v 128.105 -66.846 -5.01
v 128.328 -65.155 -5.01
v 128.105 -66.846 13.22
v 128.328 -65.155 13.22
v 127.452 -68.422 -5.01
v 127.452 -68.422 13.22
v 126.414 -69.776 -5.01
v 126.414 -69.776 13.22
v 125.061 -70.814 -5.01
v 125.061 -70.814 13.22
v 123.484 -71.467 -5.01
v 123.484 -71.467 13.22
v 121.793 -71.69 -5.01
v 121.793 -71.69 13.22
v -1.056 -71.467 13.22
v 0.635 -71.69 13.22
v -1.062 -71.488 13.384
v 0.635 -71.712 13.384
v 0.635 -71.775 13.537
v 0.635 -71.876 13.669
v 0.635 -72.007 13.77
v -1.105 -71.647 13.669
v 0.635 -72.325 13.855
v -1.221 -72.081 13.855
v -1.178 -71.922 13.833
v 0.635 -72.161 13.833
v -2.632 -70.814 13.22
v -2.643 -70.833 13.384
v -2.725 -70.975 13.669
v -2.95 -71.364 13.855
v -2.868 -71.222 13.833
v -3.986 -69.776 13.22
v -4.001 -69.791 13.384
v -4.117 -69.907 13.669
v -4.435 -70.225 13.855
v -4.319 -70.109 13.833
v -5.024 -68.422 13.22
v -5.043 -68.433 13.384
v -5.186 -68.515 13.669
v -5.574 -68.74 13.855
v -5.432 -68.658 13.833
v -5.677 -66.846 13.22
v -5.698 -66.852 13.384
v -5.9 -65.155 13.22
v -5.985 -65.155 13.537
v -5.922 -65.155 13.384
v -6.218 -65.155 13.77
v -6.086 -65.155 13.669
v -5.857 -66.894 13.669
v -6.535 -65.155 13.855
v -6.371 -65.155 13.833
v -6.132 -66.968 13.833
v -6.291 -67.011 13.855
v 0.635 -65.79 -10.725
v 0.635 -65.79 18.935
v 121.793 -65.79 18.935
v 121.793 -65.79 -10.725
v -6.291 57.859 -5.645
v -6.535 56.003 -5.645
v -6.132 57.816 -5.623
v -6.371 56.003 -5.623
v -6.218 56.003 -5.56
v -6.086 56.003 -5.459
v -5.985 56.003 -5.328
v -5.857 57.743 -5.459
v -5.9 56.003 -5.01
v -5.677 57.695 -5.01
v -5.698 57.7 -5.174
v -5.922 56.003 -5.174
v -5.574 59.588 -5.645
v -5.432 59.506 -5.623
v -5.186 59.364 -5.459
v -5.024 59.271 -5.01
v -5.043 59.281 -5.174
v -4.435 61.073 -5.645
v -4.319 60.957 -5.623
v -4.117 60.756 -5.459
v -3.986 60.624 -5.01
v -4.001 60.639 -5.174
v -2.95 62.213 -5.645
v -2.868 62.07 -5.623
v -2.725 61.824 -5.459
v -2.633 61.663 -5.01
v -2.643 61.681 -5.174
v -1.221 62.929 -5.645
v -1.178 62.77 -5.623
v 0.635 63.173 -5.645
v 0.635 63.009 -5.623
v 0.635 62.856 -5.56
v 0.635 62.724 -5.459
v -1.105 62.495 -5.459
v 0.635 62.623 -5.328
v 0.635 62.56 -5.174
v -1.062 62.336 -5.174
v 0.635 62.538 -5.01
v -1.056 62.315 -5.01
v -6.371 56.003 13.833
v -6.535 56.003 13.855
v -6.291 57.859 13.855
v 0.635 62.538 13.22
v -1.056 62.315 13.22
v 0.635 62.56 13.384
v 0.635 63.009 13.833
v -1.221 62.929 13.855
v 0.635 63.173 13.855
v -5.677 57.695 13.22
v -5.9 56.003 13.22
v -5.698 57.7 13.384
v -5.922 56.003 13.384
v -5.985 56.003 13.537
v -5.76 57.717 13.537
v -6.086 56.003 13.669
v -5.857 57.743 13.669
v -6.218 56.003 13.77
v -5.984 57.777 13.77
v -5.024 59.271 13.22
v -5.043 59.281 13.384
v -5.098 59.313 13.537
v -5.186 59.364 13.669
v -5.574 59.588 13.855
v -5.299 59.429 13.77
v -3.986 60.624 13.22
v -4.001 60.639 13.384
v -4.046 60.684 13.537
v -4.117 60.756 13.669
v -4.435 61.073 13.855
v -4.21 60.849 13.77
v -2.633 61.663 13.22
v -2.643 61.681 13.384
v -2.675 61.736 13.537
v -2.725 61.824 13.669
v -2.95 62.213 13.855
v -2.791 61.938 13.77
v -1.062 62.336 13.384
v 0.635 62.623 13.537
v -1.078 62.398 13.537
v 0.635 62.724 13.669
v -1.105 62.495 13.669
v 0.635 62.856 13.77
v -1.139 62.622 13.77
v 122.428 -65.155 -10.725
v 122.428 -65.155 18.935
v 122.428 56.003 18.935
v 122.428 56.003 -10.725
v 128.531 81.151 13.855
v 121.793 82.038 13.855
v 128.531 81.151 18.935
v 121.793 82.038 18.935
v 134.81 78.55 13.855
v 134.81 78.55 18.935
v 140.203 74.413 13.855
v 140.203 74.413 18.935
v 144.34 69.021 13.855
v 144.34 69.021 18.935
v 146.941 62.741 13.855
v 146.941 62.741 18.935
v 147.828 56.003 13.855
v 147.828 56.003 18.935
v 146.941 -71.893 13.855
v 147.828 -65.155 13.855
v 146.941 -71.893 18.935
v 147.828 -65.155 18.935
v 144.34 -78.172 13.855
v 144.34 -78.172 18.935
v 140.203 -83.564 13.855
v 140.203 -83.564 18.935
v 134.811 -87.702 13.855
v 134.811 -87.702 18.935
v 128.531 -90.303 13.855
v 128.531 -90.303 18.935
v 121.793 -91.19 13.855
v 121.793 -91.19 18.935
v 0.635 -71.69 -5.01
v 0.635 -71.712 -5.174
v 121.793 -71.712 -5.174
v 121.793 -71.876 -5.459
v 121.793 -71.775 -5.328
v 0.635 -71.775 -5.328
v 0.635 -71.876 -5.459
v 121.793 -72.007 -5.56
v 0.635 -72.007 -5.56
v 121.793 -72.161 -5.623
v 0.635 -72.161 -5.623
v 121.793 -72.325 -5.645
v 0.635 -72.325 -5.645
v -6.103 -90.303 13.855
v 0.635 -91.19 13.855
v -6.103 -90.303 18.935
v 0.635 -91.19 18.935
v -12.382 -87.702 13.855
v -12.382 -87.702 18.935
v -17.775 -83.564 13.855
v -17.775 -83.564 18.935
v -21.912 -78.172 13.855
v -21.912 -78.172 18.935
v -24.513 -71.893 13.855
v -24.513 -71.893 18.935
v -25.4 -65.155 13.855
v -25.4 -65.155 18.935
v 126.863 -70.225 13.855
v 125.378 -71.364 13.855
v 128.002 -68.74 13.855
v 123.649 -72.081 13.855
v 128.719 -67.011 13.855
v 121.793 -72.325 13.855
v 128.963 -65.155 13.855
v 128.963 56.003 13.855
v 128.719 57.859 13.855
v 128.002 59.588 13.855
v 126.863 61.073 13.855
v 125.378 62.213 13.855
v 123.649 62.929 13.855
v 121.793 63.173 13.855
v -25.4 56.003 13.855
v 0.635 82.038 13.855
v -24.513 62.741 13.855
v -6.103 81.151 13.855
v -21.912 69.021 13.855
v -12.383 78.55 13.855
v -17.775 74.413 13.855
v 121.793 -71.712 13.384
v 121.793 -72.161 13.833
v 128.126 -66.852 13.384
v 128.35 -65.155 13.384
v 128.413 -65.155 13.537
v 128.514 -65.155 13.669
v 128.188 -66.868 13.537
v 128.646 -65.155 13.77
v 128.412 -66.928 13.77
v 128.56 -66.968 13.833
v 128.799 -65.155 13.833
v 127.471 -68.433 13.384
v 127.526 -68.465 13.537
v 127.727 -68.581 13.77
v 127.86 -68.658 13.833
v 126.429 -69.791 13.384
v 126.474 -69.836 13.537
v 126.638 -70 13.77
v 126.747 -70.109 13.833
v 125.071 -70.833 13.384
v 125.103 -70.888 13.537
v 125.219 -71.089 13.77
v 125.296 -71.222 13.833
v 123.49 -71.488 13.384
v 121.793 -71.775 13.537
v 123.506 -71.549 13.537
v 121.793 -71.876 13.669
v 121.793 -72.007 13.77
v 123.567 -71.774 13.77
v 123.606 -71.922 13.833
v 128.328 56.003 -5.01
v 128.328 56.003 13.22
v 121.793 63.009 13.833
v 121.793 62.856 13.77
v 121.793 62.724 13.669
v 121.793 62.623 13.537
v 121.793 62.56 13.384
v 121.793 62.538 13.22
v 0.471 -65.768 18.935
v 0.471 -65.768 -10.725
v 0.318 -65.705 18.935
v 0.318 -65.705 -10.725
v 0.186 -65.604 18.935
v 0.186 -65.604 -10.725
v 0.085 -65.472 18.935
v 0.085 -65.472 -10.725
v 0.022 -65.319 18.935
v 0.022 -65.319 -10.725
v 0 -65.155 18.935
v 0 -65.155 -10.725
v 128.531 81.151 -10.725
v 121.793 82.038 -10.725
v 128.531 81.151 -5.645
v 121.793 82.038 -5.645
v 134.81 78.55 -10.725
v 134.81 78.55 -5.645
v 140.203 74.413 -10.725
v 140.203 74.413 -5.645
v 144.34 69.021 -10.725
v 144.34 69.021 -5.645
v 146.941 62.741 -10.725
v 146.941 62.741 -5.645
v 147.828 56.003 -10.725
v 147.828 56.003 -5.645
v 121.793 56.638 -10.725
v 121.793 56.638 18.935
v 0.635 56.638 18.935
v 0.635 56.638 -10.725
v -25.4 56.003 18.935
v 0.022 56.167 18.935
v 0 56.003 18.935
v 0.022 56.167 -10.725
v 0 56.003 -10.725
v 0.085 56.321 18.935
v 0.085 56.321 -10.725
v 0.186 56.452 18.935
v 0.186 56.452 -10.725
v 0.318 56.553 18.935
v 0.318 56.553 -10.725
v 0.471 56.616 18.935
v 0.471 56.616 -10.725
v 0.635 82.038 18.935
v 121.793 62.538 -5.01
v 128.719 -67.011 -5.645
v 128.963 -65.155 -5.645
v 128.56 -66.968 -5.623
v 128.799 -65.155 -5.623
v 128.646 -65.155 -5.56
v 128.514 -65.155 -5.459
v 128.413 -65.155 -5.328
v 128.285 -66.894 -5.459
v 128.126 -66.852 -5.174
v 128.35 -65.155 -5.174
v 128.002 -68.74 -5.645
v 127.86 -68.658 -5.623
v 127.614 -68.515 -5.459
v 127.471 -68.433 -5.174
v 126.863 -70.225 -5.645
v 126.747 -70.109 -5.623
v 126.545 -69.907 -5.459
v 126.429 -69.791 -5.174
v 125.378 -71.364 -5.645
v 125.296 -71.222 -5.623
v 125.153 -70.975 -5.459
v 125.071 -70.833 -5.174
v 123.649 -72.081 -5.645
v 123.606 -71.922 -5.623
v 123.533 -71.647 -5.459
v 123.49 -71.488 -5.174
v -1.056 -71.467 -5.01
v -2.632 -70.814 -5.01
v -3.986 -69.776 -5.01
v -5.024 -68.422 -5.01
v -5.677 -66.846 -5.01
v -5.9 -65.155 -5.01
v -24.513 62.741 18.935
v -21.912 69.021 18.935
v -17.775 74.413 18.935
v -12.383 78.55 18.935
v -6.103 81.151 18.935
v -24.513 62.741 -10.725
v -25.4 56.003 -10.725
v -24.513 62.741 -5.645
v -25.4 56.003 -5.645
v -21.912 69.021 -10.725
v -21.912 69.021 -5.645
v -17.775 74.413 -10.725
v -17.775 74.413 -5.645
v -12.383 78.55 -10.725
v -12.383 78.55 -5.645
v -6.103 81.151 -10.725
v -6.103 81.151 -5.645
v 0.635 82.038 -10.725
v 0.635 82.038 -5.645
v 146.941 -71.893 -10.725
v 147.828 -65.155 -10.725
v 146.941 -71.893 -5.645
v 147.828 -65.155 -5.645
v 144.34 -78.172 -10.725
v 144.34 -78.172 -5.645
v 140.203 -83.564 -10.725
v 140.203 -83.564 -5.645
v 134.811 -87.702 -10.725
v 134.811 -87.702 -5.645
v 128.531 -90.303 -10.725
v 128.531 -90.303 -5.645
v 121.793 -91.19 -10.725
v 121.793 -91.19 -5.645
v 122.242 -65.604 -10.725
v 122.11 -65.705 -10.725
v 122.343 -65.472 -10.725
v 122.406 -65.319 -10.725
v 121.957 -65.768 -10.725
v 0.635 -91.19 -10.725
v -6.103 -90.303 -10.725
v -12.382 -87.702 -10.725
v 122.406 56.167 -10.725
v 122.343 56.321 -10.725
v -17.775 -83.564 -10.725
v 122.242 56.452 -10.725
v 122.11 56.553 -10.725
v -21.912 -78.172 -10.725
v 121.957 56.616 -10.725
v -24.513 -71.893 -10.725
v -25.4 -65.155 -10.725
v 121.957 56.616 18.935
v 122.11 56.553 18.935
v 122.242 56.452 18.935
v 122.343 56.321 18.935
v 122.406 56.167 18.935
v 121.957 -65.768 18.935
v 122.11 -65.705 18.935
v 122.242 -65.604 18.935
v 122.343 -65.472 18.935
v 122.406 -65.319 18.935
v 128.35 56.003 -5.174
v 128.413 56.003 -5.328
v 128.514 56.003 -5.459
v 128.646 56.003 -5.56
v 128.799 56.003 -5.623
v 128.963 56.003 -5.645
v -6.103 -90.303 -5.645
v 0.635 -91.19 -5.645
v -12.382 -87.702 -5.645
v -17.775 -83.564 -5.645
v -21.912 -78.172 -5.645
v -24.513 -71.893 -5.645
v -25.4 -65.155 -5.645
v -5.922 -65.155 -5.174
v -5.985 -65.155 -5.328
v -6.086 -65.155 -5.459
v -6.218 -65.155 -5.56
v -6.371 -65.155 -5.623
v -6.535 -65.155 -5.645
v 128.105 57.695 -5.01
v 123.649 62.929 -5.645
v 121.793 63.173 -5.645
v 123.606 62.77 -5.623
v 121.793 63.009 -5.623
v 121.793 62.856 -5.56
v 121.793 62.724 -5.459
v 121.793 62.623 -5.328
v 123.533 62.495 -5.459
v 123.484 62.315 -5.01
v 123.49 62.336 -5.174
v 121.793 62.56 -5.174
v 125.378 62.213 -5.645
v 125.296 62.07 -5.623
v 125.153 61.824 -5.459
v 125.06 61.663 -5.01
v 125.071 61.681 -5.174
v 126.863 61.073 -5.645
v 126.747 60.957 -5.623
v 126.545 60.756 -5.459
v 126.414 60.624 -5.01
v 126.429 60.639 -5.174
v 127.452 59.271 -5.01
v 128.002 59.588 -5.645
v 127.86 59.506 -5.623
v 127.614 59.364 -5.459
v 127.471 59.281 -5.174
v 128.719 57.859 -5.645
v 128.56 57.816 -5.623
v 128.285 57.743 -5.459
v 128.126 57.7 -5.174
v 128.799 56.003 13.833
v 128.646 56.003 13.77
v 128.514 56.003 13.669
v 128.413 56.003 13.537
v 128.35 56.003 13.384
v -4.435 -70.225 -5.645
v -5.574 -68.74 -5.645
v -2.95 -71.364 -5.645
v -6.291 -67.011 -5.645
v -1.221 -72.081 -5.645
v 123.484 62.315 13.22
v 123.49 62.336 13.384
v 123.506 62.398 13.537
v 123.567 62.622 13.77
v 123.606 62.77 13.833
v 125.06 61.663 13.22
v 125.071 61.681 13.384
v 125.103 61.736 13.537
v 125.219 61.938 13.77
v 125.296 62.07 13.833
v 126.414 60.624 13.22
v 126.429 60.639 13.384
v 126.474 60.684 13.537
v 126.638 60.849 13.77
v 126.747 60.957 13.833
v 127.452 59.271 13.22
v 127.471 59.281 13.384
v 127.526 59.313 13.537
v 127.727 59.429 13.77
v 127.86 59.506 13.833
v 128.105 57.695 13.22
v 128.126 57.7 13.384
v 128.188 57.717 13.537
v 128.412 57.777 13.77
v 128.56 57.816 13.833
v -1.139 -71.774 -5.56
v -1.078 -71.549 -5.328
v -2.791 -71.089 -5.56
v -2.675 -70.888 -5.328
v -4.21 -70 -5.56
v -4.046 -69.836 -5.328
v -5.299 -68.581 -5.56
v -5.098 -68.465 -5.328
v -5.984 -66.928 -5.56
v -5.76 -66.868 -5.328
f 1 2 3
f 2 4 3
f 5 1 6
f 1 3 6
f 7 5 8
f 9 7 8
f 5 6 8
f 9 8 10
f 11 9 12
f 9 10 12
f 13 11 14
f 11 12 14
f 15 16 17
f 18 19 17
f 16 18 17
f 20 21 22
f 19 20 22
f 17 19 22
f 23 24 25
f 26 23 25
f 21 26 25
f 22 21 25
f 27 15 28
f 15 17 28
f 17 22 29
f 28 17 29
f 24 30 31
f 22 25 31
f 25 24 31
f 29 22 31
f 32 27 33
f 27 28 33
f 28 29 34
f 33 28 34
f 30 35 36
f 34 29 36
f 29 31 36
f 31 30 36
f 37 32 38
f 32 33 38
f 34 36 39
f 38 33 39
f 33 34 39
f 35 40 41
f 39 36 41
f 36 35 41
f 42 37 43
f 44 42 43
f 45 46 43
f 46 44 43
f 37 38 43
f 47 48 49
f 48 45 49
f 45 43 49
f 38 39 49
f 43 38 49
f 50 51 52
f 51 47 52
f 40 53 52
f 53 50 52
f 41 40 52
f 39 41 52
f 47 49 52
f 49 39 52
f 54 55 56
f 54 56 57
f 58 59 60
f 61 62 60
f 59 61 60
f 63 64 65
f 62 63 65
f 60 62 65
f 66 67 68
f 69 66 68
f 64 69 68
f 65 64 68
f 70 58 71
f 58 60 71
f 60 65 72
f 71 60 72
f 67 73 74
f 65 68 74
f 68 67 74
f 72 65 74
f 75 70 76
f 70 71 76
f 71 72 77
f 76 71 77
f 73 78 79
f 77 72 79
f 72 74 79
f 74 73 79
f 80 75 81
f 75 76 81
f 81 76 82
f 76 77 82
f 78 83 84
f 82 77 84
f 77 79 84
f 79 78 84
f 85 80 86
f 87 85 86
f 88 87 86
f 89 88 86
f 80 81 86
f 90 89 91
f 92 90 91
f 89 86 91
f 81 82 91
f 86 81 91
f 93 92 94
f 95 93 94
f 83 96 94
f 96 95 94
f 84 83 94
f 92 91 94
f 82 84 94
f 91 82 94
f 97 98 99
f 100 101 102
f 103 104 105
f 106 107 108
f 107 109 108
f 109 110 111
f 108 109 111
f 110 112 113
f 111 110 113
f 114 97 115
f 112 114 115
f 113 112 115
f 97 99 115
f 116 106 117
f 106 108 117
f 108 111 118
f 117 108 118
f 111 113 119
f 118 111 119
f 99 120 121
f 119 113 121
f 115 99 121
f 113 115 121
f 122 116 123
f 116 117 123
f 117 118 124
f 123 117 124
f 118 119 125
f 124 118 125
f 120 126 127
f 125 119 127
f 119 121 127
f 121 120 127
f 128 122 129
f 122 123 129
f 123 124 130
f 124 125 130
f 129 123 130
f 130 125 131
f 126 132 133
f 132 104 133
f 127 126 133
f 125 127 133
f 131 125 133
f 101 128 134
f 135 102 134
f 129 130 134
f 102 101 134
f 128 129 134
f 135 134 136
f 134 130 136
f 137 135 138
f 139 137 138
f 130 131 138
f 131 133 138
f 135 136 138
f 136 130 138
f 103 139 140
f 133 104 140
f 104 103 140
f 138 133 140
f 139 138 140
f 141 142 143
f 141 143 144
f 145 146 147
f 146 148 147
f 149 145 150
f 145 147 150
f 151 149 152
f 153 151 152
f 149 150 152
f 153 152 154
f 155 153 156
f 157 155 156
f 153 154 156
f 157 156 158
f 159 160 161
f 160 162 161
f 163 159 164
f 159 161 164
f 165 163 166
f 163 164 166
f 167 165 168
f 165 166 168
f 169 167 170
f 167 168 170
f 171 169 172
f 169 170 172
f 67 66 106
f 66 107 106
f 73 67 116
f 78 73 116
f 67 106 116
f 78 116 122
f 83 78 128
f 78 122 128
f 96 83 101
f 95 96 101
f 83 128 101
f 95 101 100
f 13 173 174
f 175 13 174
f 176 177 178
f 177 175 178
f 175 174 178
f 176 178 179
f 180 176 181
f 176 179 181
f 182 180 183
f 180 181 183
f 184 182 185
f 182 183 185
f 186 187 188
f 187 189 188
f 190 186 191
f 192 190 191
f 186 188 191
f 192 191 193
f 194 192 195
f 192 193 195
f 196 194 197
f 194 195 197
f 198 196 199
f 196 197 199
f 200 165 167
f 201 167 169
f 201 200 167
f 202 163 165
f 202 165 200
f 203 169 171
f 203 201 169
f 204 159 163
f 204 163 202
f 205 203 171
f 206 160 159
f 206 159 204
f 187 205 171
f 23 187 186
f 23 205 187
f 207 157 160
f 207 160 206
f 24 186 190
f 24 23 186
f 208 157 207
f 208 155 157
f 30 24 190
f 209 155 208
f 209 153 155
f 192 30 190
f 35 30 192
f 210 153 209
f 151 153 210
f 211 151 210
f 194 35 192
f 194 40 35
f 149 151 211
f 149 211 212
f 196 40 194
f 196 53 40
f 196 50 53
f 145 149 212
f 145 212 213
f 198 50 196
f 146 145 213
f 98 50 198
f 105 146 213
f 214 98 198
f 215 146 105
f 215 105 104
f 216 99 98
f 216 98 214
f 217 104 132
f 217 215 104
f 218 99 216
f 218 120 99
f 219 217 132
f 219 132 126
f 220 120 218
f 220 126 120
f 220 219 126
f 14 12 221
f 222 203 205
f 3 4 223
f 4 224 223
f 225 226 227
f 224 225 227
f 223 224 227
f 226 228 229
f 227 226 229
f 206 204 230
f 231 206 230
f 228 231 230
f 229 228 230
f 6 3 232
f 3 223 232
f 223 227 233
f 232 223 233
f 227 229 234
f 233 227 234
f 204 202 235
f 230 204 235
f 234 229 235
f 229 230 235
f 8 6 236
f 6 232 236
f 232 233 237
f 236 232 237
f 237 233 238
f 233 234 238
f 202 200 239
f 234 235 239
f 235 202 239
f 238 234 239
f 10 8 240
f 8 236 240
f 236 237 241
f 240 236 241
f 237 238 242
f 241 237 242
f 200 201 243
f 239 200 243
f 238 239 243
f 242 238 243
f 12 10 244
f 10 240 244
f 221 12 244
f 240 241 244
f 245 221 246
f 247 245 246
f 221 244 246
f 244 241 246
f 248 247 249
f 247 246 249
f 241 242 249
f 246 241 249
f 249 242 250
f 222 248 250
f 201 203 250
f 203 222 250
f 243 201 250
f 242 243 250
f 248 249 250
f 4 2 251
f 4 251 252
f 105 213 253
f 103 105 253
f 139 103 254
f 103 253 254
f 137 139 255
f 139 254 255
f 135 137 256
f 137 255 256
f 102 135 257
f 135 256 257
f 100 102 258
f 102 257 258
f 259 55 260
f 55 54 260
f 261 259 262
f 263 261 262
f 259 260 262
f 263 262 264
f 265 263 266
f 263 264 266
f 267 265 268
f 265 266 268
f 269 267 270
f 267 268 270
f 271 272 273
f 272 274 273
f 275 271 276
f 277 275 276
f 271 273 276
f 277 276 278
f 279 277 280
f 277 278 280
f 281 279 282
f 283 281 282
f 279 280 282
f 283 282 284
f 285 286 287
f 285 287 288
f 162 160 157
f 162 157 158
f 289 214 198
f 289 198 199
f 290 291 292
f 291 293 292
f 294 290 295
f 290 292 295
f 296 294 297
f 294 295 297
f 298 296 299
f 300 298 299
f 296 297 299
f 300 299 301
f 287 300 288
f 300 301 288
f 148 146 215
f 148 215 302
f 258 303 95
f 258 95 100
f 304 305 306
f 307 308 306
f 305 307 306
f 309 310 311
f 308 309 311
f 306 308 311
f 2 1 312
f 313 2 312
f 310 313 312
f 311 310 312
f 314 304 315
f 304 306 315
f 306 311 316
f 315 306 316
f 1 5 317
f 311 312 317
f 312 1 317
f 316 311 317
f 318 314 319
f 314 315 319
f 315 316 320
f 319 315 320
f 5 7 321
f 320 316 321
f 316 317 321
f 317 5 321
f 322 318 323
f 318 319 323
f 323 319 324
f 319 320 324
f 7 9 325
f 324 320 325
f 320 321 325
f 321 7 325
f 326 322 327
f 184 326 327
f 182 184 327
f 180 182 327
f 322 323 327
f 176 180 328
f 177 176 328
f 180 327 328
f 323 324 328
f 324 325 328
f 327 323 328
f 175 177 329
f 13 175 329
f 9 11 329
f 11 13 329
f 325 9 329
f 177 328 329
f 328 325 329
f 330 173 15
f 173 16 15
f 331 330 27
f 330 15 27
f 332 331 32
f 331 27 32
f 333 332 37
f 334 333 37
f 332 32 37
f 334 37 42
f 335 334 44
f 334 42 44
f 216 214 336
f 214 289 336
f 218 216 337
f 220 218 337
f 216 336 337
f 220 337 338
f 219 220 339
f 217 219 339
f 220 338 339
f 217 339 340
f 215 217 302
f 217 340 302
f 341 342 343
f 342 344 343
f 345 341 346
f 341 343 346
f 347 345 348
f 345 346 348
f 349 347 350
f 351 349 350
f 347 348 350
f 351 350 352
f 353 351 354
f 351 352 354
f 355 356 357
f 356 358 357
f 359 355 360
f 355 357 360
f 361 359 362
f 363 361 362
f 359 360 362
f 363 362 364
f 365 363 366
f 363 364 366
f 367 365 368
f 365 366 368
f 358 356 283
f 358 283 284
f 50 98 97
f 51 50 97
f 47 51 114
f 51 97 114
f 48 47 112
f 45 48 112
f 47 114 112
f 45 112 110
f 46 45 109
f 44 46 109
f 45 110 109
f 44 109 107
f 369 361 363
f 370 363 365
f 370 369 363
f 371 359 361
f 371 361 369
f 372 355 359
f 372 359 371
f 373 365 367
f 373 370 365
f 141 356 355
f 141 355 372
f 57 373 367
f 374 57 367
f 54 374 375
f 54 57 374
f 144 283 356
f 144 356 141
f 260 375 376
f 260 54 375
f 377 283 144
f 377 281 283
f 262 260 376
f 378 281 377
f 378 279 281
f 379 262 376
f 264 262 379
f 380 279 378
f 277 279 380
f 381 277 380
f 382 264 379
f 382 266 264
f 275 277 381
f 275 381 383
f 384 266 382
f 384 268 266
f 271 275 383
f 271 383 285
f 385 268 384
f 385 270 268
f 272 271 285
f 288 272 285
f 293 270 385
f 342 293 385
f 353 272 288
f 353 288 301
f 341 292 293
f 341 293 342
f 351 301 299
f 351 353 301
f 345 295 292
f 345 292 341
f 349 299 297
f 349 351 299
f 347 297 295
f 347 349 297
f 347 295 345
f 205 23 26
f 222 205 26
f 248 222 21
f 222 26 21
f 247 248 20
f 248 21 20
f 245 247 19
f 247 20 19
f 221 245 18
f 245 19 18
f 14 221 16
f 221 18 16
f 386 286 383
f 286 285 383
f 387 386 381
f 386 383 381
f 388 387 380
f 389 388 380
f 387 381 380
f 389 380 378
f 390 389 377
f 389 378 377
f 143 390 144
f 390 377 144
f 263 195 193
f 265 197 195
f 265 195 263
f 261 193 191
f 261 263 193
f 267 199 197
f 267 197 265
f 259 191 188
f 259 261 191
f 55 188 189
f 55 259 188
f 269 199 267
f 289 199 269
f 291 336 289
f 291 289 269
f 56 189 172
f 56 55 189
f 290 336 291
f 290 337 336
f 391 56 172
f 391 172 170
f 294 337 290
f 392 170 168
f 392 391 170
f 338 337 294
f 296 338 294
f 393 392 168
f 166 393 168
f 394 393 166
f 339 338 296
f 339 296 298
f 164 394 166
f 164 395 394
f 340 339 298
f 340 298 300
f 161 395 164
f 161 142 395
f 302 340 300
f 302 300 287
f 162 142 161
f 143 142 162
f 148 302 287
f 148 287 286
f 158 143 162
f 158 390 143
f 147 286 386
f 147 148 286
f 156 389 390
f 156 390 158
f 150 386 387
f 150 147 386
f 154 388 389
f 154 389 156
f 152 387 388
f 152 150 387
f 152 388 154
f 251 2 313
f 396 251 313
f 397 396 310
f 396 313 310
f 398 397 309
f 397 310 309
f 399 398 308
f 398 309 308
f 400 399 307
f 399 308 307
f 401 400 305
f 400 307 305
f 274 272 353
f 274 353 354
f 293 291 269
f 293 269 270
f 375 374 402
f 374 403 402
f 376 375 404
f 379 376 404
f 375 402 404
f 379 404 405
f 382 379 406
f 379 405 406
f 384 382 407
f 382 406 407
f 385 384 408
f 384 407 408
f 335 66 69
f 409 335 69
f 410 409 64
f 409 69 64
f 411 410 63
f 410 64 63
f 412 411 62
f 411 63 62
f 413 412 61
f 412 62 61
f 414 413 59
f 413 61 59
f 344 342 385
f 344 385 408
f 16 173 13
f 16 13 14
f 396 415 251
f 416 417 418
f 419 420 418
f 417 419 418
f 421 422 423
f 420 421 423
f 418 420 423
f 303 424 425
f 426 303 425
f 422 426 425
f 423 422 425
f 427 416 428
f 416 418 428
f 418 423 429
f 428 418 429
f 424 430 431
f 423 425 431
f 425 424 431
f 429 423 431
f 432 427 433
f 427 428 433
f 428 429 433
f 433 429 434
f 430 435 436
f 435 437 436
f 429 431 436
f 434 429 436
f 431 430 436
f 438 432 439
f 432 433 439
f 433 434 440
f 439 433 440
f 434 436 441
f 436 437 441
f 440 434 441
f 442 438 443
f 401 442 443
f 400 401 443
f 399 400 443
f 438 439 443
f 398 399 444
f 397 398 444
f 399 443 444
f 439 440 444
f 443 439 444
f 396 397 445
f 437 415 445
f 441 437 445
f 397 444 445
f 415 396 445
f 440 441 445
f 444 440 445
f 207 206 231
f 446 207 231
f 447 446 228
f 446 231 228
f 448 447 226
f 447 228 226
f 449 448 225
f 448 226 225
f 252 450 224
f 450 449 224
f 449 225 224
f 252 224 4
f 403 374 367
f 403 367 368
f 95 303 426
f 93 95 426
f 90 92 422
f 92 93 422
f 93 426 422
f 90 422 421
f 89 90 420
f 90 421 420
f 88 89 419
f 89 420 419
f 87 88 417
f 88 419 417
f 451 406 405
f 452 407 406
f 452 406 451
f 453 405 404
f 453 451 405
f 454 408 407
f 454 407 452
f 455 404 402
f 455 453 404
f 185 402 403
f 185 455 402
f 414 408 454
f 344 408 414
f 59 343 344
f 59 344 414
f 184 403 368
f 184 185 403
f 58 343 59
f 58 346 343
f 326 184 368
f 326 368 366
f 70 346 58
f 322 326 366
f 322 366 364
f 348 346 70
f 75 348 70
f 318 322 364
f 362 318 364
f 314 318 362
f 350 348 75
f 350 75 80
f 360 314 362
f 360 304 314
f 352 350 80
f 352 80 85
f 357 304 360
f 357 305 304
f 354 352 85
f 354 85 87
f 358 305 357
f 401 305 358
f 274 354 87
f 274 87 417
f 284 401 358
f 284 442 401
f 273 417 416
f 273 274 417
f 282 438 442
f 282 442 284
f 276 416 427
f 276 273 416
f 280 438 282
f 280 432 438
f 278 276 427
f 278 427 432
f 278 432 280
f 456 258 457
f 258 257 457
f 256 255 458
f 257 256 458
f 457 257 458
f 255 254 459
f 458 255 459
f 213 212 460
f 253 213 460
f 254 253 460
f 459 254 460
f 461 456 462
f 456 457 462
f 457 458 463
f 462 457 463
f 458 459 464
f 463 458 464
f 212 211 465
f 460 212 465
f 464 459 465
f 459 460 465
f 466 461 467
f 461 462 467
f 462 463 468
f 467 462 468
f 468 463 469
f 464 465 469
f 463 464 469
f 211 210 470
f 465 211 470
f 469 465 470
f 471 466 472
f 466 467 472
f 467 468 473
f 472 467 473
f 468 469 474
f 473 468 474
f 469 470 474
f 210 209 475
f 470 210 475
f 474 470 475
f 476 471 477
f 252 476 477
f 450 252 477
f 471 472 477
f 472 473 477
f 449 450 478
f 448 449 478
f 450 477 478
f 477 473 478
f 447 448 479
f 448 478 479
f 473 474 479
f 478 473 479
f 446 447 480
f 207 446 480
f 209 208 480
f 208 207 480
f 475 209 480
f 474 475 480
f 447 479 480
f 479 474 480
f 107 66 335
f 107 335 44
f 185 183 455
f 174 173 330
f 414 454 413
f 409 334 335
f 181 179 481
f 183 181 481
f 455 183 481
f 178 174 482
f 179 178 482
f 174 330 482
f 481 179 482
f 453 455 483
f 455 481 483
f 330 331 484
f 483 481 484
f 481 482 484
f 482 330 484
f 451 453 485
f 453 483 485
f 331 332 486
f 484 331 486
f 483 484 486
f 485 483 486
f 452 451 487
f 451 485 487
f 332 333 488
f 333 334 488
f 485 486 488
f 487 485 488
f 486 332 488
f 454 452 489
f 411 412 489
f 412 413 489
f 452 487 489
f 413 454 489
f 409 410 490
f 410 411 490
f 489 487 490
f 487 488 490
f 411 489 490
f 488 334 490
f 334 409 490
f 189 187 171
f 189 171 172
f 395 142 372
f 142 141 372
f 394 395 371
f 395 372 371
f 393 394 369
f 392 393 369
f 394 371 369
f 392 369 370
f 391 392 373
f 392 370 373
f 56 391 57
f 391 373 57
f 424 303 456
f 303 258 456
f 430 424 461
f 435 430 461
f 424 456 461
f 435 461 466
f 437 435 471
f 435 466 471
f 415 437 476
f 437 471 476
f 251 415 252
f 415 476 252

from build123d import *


with BuildPart() as part:
    # Sweep1: sweep along a path in Sketch4
    with BuildLine(Plane.XY) as sweep1_path:
        Line((0, -65.154874543), (0, 56.003125457))
        ThreePointArc((0, 56.003125457), (0.185987194, 56.452138263), (0.635, 56.638125457))
        Line((0.635, 56.638125457), (121.793, 56.638125457))
        ThreePointArc((121.793, 56.638125457), (122.242012806, 56.452138263), (122.428, 56.003125457))
        Line((122.428, 56.003125457), (122.428, -65.154874543))
        ThreePointArc((122.428, -65.154874543), (122.242012806, -65.603887349), (121.793, -65.789874543))
        Line((121.793, -65.789874543), (0.635, -65.789874543))
        ThreePointArc((0.635, -65.789874543), (0.185987194, -65.603887349), (0, -65.154874543))
    # Sketch3 → Sweep1 (sweep)
    with BuildSketch(Plane(origin=(0, 0, 0), x_dir=(1, 0, 0), z_dir=(0, 1, 0))):
        with BuildLine():
            Line((0, 0), (0, 10.72500014))
            Line((0, 10.72500014), (-25.4, 10.72500014))
            Line((-25.4, 10.72500014), (-25.4, 5.64500014))
            Line((-25.4, 5.64500014), (-6.535, 5.64500014))
            ThreePointArc((-6.535, 5.64500014), (-6.085987194, 5.459012946), (-5.9, 5.01000014))
            Line((-5.9, 5.01000014), (-5.9, -13.21999986))
            ThreePointArc((-5.9, -13.21999986), (-6.085987194, -13.669012666), (-6.535, -13.85499986))
            Line((-6.535, -13.85499986), (-25.4, -13.85499986))
            Line((-25.4, -13.85499986), (-25.4, -18.93499986))
            Line((-25.4, -18.93499986), (0, -18.93499986))
            Line((0, -18.93499986), (0, 0))
        make_face()
    sweep(path=sweep1_path.line)


solid = part.part
